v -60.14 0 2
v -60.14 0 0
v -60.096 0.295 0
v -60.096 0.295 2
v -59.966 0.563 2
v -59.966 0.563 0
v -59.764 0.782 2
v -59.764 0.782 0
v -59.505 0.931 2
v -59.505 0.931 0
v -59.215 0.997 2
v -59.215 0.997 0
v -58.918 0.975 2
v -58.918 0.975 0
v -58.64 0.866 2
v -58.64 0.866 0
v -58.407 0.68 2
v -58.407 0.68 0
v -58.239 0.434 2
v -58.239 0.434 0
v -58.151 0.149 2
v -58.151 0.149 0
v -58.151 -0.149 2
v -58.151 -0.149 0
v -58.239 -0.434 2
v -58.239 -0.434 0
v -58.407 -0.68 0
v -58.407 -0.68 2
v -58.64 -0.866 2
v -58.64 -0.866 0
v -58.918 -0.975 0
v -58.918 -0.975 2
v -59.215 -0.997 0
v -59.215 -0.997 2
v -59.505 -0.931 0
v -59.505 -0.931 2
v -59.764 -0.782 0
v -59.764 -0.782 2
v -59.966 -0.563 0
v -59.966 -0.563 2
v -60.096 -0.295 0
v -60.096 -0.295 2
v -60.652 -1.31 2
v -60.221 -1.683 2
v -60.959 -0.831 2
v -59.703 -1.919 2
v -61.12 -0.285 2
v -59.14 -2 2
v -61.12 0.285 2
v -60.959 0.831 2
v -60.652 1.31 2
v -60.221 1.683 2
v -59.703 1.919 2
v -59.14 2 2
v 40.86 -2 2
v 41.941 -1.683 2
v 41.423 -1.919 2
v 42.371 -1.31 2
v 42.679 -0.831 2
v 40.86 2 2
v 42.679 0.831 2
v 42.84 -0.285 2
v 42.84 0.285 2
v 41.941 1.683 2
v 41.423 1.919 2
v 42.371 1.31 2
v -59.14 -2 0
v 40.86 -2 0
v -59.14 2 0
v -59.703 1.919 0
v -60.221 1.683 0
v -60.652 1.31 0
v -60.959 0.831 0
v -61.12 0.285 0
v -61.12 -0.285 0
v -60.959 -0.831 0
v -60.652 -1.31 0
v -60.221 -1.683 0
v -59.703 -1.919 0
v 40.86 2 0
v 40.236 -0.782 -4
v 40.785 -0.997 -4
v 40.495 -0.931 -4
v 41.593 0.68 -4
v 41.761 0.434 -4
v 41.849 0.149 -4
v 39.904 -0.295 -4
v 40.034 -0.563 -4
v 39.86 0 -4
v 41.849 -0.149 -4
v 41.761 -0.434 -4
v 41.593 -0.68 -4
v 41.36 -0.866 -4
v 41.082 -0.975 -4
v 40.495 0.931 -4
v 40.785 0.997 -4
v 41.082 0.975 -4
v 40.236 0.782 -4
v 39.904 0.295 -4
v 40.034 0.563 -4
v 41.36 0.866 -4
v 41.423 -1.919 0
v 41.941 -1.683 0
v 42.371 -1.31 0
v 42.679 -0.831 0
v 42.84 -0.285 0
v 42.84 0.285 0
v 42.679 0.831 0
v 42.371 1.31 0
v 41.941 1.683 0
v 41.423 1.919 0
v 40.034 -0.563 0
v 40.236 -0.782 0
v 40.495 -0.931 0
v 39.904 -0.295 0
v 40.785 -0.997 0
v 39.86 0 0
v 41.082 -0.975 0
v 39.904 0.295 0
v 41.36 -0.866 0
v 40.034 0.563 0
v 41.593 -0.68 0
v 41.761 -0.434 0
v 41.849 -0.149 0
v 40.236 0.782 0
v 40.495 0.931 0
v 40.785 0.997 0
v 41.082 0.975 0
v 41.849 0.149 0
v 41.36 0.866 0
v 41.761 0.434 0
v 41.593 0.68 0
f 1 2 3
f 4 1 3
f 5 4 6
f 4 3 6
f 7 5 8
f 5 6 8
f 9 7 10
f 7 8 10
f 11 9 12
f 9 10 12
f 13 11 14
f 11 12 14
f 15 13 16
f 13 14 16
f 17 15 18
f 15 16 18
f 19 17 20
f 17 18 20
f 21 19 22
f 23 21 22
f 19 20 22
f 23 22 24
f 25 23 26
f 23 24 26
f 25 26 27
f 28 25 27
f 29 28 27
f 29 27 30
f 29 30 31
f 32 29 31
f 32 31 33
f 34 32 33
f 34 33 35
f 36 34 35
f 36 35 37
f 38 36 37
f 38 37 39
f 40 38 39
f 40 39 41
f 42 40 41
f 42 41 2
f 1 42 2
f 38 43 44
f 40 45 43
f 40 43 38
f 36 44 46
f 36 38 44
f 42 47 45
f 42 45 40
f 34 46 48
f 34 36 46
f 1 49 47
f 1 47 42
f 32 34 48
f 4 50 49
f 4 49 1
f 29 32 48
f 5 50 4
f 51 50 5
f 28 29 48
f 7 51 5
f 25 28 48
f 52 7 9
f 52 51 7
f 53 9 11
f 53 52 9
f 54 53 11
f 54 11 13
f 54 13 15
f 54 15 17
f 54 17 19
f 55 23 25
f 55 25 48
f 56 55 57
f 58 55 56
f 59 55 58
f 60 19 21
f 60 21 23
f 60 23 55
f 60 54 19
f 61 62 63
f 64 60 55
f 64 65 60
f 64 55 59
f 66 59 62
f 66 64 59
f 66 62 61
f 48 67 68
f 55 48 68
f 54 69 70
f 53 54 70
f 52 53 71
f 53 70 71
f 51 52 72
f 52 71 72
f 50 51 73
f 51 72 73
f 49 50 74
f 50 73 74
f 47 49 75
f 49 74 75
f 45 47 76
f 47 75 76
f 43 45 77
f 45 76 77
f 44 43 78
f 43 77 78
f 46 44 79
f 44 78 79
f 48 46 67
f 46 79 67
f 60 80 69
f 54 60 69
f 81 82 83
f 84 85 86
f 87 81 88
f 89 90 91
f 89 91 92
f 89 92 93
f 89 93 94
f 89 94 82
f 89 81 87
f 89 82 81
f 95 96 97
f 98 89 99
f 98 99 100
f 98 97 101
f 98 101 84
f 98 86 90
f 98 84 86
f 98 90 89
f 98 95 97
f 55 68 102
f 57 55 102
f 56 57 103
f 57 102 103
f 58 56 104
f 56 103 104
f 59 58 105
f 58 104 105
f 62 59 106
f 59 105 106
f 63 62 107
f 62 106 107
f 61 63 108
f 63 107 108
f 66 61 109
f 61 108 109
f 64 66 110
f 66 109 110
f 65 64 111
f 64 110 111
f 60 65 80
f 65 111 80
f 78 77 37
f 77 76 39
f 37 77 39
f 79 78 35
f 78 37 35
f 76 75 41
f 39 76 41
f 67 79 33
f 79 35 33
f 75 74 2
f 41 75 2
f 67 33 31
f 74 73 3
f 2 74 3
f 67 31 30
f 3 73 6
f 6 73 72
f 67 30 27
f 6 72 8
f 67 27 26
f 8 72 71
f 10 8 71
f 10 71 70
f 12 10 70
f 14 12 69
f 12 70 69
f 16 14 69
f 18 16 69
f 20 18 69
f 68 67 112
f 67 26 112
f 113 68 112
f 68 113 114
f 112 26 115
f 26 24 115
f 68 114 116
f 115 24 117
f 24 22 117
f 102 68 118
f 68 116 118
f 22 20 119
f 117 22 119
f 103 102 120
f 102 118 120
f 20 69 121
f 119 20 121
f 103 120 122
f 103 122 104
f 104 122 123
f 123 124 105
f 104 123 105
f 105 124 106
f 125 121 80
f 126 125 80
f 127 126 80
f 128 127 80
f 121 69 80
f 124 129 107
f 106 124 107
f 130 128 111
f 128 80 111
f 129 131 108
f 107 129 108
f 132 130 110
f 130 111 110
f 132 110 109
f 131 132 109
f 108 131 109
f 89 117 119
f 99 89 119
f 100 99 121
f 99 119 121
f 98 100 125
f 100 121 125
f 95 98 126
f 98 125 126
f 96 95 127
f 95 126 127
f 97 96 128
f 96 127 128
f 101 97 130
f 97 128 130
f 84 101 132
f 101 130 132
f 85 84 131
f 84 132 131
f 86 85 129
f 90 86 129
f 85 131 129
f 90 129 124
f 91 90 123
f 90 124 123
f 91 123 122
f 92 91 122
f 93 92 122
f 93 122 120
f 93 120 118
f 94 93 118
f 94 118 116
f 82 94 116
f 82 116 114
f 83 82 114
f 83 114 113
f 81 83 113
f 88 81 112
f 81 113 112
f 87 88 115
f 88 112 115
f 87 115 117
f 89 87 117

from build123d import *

# Parameters (mm, degrees)
EXTRUDE_1_DEPTH     = 2
SKETCH_2_R          = 1
EXTRUDE_2_DEPTH     = 4
SKETCH_3_R          = 1
CUT_EXTRUDE_1_DEPTH = 4


with BuildPart() as part:
    # 草图1 → 凸台-拉伸1 (new body)
    with BuildSketch(Plane.XY):
        with BuildLine():
            Line((-59.140028095, -2), (40.859971905, -2))
            ThreePointArc((40.859971905, -2), (42.859971905, 0), (40.859971905, 2))
            Line((40.859971905, 2), (-59.140028095, 2))
            ThreePointArc((-59.140028095, 2), (-61.140028095, 0), (-59.140028095, -2))
        make_face()
    extrude(amount=EXTRUDE_1_DEPTH)

    # 草图2 → 凸台-拉伸2 (add)
    with BuildSketch(Plane(origin=(0, 0, 0), x_dir=(-1, 0, 0), z_dir=(0, 0, -1))):
        with Locations((-40.859971905, 0)):
            Circle(SKETCH_2_R)
    extrude(amount=EXTRUDE_2_DEPTH)

    # 草图3 → 切除-拉伸1 (cut)
    with BuildSketch(Plane(origin=(0, 0, 0), x_dir=(-1, 0, 0), z_dir=(0, 0, -1))):
        with Locations((59.140028095, 0)):
            Circle(SKETCH_3_R)
    extrude(amount=-CUT_EXTRUDE_1_DEPTH, mode=Mode.SUBTRACT)


solid = part.part
